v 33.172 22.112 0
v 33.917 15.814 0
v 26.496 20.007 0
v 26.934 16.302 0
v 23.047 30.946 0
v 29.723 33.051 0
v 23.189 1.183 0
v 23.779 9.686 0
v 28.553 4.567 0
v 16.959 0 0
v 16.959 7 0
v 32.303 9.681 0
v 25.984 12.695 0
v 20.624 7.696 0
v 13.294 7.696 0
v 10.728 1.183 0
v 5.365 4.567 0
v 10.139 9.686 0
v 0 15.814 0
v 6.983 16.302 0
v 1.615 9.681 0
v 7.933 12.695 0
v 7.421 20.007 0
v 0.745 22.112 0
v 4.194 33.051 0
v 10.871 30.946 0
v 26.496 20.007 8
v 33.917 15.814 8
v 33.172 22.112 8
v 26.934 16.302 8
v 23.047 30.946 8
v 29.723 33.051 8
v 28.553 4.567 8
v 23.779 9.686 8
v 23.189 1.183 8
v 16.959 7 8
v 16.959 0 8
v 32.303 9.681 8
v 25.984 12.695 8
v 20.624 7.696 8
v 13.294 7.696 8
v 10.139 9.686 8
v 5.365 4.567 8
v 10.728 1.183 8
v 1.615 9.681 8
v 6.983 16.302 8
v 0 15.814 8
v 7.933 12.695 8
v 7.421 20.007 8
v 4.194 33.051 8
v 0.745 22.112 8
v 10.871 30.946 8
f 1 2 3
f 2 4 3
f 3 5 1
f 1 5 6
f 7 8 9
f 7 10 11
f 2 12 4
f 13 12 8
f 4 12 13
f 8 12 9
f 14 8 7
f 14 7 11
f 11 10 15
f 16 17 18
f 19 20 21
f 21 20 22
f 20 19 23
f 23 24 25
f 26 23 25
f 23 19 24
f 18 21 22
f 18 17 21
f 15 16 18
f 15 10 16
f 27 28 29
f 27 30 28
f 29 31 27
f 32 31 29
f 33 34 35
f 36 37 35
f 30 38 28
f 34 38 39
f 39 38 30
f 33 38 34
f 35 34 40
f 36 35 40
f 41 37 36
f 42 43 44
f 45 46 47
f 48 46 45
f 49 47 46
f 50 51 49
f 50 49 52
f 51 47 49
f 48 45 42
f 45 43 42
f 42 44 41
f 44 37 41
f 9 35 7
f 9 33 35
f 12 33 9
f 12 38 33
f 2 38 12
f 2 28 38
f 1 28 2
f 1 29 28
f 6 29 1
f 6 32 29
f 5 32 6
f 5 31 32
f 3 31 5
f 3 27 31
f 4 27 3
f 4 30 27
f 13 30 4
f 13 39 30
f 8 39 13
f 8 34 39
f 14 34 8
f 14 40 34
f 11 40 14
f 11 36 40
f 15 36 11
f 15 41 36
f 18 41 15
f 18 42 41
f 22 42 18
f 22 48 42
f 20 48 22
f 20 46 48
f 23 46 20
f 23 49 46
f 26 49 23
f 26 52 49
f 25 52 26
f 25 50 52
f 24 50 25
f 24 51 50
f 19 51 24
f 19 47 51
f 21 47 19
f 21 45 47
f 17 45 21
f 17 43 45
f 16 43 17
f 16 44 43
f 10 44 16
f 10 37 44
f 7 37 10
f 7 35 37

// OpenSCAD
$fn = 32;

// ----------------------------------------------------------------------
// Clip blank: omega clip, 8 mm thick
// ----------------------------------------------------------------------

// --- parameters (mm) ---
profile_height = 8;       // extrusion height
profile_points = 26;      // points of the closed outline

profile = [[0.745, 22.112], [0, 15.814], [1.615, 9.681], [5.365, 4.567], [10.728, 1.183], [16.959, 0], [23.189, 1.183], [28.553, 4.567], [32.303, 9.681], [33.917, 15.814], [33.172, 22.112], [29.723, 33.051], [23.047, 30.946], [26.496, 20.007], [26.934, 16.302], [25.984, 12.695], [23.779, 9.686], [20.624, 7.696], [16.959, 7], [13.294, 7.696], [10.139, 9.686], [7.933, 12.695], [6.983, 16.302], [7.421, 20.007], [10.871, 30.946], [4.194, 33.051]];  // single closed polygon, 26 points, counter clockwise

// --- the one profile operation ---
linear_extrude(height = profile_height) polygon(points = profile);
